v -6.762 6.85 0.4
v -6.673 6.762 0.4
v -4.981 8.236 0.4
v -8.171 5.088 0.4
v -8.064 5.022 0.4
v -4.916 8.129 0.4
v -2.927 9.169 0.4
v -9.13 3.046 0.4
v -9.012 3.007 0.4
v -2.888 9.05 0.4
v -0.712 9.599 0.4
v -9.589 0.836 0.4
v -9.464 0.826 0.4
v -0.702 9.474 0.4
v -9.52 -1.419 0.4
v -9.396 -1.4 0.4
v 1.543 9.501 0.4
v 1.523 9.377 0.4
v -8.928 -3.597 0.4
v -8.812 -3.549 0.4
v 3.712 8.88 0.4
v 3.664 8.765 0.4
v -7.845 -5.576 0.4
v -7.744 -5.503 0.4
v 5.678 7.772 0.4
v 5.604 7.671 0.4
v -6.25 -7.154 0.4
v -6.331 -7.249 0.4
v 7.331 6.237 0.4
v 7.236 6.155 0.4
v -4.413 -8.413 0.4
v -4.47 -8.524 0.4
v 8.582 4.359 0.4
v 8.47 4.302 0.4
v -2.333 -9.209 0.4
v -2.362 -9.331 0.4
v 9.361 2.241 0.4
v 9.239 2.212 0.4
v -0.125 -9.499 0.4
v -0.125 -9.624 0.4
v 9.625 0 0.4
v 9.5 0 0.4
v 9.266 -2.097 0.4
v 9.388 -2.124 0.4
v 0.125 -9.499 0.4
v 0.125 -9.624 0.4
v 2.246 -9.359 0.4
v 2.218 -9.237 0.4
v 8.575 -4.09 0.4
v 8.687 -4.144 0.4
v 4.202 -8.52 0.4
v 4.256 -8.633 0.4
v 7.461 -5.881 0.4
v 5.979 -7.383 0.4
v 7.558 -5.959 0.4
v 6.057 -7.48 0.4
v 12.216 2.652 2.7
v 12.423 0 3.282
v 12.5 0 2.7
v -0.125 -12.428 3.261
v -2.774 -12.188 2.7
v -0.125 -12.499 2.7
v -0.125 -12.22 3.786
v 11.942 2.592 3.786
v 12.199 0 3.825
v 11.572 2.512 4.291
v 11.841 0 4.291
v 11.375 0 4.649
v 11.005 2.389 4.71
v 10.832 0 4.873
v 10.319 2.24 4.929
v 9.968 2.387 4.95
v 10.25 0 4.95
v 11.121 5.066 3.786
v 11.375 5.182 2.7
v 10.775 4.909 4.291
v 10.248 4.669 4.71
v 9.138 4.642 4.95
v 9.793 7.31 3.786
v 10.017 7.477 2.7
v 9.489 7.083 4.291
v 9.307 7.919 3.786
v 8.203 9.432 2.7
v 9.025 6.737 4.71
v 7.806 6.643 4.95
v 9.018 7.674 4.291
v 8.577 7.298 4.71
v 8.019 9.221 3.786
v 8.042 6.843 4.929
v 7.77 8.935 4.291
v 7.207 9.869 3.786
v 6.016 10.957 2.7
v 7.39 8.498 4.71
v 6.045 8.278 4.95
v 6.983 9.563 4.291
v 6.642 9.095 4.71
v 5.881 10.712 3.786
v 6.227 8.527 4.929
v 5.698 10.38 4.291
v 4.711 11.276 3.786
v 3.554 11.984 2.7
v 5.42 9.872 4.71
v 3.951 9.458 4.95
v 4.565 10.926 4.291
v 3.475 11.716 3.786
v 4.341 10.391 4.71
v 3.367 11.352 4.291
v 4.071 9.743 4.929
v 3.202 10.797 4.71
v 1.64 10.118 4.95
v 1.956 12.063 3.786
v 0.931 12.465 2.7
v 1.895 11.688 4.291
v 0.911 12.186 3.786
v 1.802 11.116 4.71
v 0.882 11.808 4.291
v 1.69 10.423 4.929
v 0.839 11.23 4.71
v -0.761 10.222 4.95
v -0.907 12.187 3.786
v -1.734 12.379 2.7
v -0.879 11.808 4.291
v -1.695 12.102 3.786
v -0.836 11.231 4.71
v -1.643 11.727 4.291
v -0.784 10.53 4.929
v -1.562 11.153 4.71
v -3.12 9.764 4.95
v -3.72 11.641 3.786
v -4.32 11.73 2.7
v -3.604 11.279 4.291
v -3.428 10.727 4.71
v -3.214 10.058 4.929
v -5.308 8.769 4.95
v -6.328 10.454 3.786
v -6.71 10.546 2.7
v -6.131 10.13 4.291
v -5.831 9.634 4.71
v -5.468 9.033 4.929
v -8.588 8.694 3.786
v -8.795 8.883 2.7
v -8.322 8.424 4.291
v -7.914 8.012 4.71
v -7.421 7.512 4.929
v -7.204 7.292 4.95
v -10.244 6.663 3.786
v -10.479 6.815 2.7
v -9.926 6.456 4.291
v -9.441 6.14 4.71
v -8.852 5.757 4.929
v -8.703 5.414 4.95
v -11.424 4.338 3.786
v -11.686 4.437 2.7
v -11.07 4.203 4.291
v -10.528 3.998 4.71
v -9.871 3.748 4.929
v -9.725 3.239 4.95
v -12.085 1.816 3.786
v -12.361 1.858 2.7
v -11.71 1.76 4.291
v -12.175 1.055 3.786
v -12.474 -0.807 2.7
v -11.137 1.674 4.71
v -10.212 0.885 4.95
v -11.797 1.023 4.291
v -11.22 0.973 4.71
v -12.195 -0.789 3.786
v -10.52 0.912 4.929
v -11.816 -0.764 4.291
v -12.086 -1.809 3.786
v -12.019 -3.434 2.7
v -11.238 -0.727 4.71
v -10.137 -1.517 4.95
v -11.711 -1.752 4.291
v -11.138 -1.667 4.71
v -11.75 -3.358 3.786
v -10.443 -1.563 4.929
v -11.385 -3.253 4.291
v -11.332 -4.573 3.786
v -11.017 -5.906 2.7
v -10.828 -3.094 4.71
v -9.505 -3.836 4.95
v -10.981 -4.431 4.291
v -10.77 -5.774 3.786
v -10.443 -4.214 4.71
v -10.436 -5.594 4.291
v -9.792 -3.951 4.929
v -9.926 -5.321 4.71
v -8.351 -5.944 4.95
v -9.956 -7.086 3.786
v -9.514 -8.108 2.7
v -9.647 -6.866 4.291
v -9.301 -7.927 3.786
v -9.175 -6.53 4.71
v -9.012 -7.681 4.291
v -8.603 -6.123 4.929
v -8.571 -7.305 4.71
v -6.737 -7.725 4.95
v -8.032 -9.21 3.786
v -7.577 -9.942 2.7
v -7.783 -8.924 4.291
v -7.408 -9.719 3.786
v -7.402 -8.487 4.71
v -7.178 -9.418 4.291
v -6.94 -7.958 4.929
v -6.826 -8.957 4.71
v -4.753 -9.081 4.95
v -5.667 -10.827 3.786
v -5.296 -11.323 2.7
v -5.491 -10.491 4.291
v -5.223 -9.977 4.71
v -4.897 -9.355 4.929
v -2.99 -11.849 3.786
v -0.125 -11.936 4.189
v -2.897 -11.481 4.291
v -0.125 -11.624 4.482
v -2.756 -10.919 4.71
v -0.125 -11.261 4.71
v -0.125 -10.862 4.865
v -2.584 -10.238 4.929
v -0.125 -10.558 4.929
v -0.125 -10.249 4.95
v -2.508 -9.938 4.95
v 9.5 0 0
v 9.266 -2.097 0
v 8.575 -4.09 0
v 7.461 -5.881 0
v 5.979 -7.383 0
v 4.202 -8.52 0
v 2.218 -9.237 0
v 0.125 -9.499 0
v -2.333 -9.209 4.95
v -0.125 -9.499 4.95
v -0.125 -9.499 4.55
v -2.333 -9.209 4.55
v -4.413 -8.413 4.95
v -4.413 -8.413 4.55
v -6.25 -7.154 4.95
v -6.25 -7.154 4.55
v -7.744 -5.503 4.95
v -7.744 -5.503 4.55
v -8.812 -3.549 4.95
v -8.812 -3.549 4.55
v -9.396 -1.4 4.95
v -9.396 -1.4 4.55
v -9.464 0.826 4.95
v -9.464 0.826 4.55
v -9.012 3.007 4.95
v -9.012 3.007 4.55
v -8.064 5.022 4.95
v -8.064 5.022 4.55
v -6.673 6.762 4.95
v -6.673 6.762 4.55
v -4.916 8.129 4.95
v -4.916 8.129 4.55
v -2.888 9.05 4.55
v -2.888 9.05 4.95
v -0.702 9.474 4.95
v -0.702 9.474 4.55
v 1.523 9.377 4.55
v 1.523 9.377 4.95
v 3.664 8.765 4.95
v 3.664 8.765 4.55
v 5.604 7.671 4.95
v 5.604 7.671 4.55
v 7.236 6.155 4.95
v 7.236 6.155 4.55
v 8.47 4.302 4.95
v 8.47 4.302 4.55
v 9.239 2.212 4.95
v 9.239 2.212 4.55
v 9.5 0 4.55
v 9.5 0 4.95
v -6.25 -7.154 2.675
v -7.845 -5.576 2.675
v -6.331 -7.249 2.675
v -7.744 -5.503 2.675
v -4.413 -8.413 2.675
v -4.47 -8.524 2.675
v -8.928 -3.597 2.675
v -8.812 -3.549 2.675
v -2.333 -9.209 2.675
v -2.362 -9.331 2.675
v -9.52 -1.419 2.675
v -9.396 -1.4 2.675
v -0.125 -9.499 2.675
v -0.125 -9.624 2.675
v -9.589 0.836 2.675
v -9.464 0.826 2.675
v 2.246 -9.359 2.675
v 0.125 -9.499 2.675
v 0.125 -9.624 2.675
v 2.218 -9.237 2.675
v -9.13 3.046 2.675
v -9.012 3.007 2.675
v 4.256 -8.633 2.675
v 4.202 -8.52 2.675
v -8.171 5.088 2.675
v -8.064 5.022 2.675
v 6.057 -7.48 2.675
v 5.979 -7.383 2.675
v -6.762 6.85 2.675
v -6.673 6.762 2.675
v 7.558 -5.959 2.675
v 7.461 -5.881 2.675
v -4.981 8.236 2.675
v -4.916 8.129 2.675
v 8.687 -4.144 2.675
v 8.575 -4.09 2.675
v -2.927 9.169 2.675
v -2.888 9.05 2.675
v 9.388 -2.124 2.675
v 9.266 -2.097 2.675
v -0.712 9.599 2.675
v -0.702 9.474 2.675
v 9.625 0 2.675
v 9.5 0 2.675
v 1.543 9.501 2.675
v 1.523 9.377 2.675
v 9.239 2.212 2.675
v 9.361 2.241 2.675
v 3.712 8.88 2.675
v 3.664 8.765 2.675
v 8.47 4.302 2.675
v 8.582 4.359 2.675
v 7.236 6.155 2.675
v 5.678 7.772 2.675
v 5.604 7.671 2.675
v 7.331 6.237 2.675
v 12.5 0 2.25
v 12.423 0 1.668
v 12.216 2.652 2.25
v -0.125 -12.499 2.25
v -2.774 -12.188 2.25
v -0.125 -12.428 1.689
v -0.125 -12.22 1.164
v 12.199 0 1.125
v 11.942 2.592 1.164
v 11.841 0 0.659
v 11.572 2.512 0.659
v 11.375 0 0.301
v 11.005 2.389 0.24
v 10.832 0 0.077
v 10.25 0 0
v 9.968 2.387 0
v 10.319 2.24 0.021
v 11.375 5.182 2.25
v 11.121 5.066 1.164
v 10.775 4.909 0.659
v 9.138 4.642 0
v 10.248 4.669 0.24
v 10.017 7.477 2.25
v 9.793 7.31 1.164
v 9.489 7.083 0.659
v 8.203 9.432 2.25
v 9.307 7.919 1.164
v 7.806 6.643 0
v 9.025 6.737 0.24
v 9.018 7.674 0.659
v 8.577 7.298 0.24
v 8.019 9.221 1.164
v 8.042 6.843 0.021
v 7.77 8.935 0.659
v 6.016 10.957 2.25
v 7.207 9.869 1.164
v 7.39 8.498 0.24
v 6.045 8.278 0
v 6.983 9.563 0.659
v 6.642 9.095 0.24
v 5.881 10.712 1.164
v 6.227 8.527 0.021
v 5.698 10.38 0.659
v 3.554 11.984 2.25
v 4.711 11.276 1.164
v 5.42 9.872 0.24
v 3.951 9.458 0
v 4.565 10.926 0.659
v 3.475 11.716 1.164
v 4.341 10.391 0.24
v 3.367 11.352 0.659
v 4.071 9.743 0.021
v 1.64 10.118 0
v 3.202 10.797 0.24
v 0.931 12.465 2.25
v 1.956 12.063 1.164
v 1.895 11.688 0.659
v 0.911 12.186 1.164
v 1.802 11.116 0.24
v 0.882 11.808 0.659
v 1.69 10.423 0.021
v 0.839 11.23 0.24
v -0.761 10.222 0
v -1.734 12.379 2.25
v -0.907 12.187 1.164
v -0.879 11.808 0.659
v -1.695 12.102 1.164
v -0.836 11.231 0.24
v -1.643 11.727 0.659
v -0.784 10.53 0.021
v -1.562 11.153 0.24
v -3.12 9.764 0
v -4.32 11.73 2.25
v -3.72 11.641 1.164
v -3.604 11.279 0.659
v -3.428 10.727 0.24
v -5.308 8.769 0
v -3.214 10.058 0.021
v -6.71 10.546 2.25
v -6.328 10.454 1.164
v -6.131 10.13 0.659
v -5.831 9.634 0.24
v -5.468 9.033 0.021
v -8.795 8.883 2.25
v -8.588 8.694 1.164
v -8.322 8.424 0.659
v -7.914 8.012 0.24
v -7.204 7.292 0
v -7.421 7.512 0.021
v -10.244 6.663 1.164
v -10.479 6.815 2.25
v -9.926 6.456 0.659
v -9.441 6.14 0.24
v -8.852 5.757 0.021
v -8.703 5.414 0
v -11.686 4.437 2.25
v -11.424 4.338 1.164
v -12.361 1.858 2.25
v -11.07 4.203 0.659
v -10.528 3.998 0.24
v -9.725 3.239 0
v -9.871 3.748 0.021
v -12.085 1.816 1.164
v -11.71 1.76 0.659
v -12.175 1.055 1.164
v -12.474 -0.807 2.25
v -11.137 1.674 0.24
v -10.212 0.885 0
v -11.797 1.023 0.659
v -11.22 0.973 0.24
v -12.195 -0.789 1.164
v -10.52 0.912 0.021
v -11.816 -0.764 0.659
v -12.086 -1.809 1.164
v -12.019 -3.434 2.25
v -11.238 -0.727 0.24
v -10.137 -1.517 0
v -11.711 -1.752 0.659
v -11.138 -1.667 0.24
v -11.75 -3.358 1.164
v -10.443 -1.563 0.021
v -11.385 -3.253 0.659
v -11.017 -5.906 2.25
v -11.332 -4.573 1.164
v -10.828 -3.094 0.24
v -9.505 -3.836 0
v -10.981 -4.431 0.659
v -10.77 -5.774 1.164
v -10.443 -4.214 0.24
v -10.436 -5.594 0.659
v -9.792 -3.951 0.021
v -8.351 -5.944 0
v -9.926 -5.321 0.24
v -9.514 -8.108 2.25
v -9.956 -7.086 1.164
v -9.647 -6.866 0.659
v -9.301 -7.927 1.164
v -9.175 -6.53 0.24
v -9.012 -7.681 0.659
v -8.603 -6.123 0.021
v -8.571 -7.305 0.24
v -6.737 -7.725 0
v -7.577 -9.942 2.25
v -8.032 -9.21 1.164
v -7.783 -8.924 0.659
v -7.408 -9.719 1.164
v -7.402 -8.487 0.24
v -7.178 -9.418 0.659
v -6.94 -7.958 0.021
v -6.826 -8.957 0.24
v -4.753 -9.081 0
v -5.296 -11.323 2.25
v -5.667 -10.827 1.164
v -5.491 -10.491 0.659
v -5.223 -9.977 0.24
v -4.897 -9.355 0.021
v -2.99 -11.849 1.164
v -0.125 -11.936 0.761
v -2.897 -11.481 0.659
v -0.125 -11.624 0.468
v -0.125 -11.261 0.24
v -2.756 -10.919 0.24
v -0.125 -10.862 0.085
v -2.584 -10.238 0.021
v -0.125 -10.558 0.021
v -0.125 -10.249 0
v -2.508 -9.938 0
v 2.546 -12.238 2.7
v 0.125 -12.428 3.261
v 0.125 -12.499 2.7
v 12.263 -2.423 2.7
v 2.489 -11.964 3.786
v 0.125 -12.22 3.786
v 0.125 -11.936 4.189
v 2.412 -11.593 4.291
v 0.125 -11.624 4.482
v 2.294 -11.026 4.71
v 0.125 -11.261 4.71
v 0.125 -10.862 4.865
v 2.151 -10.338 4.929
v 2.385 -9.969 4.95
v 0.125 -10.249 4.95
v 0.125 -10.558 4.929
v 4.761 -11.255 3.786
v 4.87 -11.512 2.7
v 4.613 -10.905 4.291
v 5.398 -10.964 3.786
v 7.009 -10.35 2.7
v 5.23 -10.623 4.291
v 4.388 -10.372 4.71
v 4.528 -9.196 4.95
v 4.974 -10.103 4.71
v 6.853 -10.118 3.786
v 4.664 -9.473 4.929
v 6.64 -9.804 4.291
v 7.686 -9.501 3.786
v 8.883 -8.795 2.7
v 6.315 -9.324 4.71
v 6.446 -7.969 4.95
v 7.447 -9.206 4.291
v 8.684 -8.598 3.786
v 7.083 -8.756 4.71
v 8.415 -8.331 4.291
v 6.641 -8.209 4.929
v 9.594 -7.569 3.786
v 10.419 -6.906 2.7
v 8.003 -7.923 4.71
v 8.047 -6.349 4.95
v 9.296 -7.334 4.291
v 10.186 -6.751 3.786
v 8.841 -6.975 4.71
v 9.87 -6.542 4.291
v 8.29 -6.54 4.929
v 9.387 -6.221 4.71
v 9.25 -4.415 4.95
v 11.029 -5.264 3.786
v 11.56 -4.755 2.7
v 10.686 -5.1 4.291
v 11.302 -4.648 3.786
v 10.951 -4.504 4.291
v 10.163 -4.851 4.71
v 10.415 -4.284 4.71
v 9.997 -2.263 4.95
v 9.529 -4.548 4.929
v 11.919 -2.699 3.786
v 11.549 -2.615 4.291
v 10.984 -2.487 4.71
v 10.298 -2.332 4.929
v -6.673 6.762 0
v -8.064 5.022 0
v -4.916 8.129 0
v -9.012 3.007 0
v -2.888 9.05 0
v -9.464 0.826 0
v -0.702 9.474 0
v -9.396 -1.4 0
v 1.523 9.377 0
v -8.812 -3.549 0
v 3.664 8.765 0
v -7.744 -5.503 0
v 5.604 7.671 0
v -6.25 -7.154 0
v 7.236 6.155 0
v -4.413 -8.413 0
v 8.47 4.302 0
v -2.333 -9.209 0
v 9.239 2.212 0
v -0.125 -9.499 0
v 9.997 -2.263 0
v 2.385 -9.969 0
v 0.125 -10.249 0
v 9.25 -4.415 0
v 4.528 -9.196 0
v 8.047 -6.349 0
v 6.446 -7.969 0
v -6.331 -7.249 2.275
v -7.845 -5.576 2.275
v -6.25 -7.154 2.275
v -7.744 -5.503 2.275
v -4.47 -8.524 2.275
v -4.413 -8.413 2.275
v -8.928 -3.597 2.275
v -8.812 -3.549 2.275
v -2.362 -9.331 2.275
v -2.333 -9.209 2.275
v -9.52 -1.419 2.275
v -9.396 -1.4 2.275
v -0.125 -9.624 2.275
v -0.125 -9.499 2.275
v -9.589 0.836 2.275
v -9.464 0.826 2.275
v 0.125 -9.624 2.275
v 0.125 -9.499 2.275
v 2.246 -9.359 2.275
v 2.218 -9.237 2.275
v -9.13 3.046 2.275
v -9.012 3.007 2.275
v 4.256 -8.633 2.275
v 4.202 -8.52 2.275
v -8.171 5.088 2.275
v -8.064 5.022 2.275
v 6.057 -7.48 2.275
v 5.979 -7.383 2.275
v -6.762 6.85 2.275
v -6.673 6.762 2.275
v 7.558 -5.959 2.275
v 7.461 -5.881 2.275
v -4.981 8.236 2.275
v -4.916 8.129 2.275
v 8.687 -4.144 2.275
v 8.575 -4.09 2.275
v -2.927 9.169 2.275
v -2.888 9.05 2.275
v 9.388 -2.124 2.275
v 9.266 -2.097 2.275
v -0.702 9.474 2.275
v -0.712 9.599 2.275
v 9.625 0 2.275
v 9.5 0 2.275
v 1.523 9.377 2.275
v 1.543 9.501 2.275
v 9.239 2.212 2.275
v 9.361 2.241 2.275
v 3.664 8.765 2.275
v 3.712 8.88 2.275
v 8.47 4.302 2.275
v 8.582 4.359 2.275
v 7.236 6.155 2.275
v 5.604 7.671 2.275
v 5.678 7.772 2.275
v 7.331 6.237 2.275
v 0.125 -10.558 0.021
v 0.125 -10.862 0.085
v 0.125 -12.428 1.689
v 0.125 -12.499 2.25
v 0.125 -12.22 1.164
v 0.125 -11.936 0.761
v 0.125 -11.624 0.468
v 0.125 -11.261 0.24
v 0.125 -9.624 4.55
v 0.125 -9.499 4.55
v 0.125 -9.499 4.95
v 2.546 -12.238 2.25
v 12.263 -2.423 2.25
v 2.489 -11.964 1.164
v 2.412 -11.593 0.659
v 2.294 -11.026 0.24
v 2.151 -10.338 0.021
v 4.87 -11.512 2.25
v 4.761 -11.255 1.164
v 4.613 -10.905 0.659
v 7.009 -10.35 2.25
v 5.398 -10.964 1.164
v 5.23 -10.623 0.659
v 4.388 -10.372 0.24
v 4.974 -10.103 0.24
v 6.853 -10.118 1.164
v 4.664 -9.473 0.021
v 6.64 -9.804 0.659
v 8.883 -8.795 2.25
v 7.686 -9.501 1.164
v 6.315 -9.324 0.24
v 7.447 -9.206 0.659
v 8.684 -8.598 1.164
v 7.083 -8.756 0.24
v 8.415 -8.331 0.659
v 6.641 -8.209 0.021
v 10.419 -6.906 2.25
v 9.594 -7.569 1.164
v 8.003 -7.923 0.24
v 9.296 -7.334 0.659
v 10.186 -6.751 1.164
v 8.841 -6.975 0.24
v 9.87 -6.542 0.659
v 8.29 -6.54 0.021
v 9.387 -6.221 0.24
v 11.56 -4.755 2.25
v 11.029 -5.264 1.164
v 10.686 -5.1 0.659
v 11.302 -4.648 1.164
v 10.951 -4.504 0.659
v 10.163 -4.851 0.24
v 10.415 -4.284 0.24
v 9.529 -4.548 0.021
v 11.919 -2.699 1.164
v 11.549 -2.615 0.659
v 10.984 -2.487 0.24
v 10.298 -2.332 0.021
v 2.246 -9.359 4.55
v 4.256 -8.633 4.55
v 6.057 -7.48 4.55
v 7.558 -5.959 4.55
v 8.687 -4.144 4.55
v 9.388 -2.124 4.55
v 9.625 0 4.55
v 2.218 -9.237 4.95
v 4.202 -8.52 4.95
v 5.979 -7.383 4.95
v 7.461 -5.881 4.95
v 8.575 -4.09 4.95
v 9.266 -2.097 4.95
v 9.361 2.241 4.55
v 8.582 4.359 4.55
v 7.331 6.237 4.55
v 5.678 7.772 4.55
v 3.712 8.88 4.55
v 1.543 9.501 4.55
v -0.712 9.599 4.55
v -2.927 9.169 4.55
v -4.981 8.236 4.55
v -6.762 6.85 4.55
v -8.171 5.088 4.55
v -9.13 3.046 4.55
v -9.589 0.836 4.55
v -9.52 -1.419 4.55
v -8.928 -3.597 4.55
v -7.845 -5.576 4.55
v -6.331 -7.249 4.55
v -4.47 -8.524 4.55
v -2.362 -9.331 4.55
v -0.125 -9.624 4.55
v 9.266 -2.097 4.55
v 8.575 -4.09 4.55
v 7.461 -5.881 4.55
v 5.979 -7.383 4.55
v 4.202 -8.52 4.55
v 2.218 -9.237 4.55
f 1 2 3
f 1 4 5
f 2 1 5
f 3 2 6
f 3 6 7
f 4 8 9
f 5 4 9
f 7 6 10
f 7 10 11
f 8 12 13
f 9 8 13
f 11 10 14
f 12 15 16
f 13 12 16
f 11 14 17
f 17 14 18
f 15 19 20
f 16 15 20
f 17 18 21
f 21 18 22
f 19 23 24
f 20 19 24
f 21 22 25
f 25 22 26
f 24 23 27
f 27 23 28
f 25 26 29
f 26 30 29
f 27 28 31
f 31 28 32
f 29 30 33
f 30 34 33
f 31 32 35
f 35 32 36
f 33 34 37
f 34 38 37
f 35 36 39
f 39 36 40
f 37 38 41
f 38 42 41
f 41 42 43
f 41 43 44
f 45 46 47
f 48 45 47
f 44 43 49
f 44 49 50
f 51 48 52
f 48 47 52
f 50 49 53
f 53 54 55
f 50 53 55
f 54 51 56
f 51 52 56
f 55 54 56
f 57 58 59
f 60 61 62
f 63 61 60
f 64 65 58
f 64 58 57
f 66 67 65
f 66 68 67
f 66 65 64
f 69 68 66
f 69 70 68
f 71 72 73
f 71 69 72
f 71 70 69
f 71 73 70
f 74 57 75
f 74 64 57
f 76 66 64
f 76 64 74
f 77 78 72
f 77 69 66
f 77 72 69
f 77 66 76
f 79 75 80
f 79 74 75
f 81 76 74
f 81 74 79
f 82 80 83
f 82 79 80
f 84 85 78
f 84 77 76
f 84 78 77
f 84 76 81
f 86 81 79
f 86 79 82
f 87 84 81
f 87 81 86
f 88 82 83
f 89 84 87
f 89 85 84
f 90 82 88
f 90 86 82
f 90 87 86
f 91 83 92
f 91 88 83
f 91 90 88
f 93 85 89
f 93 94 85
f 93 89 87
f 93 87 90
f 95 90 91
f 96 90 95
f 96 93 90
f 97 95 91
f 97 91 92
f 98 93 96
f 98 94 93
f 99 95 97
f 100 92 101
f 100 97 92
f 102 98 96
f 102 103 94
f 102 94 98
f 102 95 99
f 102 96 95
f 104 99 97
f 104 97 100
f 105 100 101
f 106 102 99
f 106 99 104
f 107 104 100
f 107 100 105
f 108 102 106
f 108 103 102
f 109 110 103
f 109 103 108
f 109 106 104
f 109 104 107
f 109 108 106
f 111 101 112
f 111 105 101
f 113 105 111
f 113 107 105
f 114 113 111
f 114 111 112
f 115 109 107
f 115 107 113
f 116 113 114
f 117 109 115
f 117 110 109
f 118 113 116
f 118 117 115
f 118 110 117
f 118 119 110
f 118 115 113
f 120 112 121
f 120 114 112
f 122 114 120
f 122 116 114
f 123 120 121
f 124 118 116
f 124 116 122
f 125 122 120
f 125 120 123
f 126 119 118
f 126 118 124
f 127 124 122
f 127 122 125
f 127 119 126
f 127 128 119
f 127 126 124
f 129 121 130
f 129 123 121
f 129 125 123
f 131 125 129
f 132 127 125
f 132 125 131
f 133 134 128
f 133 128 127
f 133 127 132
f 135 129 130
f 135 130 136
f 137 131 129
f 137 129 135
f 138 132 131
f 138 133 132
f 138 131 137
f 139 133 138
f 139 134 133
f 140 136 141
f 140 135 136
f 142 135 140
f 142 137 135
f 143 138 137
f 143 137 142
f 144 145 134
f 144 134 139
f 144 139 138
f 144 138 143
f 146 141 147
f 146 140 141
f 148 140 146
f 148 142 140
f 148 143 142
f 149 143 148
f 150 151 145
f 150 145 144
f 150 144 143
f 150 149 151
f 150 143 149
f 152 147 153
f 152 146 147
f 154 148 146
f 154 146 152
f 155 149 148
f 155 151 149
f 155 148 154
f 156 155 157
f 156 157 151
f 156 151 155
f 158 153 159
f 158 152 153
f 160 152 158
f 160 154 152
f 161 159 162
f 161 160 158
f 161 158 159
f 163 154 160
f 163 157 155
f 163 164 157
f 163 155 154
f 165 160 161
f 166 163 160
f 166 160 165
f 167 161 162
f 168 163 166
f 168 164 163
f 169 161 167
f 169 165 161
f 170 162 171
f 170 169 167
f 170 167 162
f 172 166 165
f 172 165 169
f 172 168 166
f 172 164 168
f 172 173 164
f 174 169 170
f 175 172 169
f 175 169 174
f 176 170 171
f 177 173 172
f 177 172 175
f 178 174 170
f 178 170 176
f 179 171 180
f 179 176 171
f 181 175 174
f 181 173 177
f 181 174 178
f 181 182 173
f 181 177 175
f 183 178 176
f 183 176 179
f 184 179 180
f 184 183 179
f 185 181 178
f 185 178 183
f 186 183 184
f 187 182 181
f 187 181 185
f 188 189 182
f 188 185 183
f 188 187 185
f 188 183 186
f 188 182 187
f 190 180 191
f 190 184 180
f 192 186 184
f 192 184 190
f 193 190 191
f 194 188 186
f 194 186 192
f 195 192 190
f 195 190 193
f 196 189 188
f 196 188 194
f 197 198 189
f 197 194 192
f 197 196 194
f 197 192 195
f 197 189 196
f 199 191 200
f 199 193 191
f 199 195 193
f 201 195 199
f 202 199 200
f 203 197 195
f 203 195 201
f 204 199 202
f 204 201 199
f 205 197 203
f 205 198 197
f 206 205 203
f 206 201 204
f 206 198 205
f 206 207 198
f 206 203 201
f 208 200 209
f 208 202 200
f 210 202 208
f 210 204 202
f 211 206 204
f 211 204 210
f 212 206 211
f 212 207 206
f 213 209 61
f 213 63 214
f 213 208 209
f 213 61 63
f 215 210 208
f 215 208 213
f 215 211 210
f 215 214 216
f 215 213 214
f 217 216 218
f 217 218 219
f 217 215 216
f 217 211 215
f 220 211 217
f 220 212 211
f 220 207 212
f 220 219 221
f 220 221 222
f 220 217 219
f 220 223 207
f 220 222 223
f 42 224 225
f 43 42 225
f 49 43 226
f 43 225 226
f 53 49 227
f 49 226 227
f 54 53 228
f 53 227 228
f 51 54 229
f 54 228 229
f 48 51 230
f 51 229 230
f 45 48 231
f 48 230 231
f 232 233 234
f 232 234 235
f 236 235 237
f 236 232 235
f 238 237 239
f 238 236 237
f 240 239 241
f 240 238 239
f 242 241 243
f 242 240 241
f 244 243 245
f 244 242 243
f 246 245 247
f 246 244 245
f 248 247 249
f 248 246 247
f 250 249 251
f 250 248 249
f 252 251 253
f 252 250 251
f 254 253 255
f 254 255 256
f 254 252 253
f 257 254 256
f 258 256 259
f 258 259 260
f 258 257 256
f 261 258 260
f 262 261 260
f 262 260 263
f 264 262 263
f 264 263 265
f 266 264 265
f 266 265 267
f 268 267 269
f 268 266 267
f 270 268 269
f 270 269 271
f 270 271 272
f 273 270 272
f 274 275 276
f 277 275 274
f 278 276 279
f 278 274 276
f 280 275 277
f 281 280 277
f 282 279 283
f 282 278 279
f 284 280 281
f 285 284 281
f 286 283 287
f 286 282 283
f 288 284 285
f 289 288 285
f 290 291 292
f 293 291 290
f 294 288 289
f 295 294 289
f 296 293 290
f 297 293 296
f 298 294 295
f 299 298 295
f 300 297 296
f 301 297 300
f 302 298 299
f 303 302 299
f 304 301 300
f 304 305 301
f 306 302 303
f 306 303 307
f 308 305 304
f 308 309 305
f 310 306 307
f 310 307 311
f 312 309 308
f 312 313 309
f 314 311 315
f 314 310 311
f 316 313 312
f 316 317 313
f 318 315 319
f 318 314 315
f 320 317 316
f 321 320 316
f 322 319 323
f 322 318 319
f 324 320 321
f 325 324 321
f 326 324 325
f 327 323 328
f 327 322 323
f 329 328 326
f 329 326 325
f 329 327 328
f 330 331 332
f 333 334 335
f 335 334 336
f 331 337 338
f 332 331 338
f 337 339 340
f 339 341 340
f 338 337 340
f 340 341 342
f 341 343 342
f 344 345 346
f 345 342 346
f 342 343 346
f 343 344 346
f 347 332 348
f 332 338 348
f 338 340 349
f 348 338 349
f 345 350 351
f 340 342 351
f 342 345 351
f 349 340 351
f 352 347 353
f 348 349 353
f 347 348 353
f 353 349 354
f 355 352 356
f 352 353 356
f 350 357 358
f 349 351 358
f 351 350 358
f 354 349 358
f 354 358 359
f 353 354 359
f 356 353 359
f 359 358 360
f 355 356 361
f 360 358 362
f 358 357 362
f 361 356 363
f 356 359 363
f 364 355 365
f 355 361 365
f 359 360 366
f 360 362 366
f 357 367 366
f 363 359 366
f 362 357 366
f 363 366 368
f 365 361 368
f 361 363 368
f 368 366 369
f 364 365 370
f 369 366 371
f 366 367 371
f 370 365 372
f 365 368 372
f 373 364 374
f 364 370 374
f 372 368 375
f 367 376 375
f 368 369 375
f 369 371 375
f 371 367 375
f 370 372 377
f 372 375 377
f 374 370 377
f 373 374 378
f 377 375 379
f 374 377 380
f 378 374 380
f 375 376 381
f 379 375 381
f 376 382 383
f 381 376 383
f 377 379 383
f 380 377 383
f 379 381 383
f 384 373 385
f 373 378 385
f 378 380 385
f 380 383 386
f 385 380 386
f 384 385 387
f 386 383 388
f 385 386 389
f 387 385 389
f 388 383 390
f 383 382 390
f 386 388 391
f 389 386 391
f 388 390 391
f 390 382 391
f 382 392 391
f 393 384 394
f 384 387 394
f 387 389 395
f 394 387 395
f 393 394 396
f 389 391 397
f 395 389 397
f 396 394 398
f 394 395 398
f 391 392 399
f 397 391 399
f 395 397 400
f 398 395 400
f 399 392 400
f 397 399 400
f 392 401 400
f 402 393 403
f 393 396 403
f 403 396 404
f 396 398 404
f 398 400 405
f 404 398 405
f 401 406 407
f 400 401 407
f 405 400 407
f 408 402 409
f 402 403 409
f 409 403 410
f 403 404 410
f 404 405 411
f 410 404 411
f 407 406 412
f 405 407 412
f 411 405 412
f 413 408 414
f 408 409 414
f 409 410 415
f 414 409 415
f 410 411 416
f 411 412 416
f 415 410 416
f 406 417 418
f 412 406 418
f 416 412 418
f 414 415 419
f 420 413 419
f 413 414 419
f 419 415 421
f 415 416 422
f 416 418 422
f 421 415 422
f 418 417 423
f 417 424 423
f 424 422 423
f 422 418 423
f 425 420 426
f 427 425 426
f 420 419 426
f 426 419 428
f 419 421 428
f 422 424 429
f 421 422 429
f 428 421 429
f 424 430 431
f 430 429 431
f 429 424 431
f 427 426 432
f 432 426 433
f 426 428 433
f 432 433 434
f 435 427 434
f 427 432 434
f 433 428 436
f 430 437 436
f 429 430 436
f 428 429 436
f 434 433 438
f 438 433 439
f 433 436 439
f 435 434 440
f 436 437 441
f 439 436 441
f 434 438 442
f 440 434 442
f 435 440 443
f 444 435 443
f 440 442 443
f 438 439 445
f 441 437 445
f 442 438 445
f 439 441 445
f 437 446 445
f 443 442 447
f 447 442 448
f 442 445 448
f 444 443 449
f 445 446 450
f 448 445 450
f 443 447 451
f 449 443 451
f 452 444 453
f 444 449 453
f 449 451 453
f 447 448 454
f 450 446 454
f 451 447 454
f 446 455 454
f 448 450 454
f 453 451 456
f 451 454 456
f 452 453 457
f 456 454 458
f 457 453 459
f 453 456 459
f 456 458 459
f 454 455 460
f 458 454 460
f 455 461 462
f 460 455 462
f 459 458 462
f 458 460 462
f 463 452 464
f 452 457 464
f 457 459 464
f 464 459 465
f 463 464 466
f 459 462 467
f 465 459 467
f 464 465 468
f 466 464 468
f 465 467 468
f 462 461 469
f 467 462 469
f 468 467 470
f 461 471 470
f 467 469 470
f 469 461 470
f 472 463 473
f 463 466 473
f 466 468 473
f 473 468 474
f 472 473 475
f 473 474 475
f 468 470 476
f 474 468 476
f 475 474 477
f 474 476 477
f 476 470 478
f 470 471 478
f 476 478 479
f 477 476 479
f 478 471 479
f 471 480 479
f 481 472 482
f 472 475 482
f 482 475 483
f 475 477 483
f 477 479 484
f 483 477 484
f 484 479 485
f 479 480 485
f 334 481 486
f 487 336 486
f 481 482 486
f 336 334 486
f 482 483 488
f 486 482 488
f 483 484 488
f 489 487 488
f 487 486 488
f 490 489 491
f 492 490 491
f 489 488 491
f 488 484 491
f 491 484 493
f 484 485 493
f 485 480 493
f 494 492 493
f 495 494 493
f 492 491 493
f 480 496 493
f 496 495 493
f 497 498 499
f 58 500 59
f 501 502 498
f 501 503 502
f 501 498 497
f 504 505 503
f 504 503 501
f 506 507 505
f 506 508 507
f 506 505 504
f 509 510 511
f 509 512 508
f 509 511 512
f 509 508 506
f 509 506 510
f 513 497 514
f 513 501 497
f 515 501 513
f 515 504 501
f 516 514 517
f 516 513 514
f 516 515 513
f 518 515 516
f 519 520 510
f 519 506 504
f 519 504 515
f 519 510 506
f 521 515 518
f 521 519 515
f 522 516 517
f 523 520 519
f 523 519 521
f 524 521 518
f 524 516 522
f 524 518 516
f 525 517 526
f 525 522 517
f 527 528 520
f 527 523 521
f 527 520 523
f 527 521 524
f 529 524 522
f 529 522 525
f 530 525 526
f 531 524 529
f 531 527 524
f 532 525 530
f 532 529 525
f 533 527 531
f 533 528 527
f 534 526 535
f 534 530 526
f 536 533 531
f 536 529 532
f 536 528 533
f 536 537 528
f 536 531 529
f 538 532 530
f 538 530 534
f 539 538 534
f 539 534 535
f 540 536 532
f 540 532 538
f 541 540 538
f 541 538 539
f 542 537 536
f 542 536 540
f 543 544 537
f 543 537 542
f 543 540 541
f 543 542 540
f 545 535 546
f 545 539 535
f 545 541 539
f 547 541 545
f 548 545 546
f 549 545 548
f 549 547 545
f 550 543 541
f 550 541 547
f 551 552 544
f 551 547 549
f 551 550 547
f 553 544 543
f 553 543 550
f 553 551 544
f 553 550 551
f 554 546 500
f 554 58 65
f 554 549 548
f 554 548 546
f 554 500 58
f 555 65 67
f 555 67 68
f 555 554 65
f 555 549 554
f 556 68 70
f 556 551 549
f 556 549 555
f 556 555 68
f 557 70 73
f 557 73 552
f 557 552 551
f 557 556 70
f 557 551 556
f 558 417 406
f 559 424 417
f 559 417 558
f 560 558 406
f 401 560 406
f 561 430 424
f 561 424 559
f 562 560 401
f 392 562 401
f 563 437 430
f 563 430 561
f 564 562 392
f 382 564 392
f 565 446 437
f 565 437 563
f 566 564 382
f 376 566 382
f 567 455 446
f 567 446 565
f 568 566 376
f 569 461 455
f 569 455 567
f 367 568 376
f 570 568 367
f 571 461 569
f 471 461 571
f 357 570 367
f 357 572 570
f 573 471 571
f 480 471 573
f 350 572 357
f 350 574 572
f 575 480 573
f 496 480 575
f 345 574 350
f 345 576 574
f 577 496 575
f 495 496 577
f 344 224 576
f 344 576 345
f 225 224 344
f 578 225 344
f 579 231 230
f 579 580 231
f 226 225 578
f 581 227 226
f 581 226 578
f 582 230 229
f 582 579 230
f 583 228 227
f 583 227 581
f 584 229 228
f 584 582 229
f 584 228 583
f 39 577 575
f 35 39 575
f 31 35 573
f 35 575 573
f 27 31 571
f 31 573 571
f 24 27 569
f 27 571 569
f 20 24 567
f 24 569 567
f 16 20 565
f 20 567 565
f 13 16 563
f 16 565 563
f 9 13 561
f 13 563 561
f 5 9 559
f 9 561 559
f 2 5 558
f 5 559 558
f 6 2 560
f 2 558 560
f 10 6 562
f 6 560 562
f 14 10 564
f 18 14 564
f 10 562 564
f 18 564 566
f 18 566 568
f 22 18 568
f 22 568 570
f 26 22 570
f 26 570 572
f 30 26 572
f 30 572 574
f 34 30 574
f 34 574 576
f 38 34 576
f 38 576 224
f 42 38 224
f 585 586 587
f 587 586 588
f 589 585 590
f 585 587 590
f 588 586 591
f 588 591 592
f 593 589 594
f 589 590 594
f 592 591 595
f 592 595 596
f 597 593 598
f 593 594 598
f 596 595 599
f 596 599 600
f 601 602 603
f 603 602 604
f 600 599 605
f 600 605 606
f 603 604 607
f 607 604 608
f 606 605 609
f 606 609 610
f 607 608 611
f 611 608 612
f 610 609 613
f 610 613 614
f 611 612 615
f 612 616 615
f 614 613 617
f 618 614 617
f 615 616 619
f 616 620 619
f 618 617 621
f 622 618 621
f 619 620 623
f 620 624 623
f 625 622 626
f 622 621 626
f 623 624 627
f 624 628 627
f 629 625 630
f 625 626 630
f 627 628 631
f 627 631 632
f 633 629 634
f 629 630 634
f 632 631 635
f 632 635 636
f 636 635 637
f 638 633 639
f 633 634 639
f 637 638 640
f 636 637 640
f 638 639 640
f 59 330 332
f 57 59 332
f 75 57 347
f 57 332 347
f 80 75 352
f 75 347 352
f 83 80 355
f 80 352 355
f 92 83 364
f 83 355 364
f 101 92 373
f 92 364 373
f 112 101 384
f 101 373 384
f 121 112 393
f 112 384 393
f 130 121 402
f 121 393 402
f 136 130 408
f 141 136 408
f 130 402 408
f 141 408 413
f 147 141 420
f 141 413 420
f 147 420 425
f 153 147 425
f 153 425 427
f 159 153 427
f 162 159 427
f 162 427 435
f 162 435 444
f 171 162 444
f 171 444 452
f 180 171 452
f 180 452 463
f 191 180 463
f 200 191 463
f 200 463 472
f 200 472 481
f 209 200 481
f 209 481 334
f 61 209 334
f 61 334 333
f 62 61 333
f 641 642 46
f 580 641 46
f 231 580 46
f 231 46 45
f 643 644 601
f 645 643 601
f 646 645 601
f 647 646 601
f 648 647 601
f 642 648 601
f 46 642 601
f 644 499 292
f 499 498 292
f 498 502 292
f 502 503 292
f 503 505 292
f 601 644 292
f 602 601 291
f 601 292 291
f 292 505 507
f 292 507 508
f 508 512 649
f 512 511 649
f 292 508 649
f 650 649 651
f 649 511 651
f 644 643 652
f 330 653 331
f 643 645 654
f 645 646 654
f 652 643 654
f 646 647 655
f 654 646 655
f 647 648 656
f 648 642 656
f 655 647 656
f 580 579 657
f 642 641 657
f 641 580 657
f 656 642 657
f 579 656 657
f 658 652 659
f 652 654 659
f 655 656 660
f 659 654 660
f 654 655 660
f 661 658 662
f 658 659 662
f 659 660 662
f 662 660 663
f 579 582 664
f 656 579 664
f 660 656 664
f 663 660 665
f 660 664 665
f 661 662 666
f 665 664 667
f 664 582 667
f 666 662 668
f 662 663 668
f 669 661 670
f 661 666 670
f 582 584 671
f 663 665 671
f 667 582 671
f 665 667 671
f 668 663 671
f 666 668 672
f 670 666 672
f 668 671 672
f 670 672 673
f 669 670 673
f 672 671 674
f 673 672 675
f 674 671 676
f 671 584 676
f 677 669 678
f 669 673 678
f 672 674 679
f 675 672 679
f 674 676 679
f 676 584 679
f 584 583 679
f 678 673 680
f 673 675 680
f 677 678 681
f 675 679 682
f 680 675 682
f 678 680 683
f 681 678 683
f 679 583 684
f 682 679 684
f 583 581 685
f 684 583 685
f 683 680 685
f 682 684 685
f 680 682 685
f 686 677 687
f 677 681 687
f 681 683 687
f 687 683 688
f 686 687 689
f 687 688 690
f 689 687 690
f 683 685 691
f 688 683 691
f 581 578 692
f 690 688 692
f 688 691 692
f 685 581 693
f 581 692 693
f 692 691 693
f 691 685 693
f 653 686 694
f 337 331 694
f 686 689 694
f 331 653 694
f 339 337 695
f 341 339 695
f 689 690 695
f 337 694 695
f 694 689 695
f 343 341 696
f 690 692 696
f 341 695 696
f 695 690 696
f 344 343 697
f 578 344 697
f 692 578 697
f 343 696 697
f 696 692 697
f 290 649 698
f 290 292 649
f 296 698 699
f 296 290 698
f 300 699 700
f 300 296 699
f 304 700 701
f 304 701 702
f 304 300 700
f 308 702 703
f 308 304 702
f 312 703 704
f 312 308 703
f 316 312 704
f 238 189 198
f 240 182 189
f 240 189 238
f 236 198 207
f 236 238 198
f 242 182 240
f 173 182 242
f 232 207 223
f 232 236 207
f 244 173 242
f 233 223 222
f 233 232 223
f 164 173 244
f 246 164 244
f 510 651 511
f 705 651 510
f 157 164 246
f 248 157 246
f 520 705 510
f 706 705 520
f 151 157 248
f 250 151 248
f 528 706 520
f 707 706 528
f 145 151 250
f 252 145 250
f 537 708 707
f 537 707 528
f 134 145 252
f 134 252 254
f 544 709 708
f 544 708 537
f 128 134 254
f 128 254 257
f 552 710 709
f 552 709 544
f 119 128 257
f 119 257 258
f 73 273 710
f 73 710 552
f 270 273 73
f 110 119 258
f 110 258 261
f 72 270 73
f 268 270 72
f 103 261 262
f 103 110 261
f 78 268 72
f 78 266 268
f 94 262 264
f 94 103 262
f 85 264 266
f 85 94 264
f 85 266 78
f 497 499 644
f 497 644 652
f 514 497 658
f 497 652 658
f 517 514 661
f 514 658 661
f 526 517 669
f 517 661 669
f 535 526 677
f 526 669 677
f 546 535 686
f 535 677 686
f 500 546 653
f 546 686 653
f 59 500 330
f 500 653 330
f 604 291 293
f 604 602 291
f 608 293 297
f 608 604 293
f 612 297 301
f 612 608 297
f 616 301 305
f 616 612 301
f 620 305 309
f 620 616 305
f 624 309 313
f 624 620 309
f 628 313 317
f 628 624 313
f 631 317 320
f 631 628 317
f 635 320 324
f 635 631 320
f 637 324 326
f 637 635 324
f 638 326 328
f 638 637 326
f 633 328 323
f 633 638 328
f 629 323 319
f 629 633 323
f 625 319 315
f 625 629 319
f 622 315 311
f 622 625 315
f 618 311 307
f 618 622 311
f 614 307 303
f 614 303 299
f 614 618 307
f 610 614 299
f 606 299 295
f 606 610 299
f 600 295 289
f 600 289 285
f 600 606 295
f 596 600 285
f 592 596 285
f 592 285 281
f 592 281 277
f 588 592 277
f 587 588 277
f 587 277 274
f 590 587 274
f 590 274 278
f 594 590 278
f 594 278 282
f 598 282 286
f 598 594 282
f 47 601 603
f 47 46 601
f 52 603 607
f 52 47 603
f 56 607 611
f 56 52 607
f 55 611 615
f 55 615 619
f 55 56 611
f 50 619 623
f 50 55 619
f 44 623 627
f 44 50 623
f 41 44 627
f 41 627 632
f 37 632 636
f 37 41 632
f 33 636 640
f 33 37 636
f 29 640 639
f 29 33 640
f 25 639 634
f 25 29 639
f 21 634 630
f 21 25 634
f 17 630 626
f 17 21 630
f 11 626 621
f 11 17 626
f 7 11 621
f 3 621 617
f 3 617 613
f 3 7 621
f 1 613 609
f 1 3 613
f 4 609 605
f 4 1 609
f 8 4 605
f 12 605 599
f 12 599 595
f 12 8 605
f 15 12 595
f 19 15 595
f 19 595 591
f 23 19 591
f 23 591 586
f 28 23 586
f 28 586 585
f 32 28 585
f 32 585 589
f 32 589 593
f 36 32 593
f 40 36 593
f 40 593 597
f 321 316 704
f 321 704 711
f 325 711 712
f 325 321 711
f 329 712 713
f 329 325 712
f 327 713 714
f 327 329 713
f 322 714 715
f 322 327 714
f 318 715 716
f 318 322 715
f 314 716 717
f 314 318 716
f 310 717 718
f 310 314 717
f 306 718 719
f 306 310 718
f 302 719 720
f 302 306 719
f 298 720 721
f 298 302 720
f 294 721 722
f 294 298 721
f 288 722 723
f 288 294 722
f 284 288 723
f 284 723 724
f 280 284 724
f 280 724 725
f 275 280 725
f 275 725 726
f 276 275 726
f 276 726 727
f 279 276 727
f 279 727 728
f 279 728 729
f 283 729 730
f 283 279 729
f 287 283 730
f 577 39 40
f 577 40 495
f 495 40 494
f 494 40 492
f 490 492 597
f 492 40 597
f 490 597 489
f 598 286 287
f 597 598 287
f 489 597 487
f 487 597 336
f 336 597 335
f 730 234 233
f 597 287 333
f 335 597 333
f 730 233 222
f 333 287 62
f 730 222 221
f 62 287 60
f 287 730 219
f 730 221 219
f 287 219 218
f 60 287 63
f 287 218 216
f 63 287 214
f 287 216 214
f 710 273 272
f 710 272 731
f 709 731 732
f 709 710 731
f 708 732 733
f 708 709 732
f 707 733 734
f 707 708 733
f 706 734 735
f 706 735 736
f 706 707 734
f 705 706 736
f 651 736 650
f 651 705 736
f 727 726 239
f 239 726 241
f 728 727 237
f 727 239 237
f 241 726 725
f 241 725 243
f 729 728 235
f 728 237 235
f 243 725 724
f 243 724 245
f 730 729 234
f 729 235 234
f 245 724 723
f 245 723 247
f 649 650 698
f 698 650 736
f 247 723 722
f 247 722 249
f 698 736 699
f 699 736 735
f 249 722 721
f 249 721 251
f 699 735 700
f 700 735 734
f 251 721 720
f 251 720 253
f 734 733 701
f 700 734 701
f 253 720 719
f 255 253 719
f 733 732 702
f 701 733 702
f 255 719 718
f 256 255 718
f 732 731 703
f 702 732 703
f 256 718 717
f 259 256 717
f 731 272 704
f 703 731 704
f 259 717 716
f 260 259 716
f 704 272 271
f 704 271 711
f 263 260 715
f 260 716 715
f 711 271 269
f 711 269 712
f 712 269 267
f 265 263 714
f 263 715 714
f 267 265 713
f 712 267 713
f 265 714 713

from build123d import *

# Parameters (mm, degrees)
F0_R      = 12.5
F0_R_2    = 9.625
F1_DEPTH  = 4.95
F2_R      = 2.25
F4_R      = 9.625
F4_R_2    = 9.5
F5_DEPTH  = 0.2
F7_R      = 9.625
F7_R_2    = 9.5
F8_DEPTH  = 0.4
F11_DEPTH = 0.4
F12_DEPTH = 25


with BuildPart() as f1:
    # F0 (on Top) → F1 (new body)
    with BuildSketch(Plane.XY):
        Circle(F0_R)
        Circle(F0_R_2, mode=Mode.SUBTRACT)
    extrude(amount=F1_DEPTH)

    # F2
    f2_edges = [f1.edges().sort_by_distance(p)[0] for p in [
        (-12.5, 0, 4.95),
        (-12.5, 0, 0),
    ]]
    fillet(f2_edges, radius=F2_R)

    # F4 (on offset) → F5 (join, symmetric)
    with BuildSketch(Plane.XY.offset(2.475)):
        Circle(F4_R)
        Circle(F4_R_2, mode=Mode.SUBTRACT)
    extrude(amount=F5_DEPTH, both=True)

    # F7 (on offset) → F8 (join)
    with BuildSketch(Plane(origin=(0, 0, 0), x_dir=(1, 0, 0), z_dir=(0, 0, -1))):
        Circle(F7_R)
        Circle(F7_R_2, mode=Mode.SUBTRACT)
    extrude(amount=-F8_DEPTH)

    # F10 (on offset) → F11 (join)
    with BuildSketch(Plane.XY.offset(4.95)):
        with BuildLine():
            ThreePointArc((0.125, -9.499177596), (0, -9.5), (-0.125, -9.499177596))
            Line((-0.125, -9.499177596), (-0.125, -9.6241882775))
            ThreePointArc((-0.125, -9.6241882775), (0, -9.625), (0.125, -9.6241882775))
            Line((0.125, -9.6241882775), (0.125, -9.499177596))
        make_face()
        with BuildLine():
            ThreePointArc((-0.125, -9.499177596), (-6.6731739075, 6.7615641681), (9.5, 0))
            ThreePointArc((9.5, 0), (6.7615641681, -6.6731739075), (0.125, -9.499177596))
            Line((0.125, -9.499177596), (0.125, -9.6241882775))
            ThreePointArc((0.125, -9.6241882775), (6.8499543794, -6.7615641681), (9.625, 0))
            ThreePointArc((9.625, 0), (-6.7615641681, 6.8499543794), (-0.125, -9.6241882775))
            Line((-0.125, -9.6241882775), (-0.125, -9.499177596))
        make_face()
    extrude(amount=-F11_DEPTH)

    # F10 (on offset) → F12 (cut)
    with BuildSketch(Plane.XY.offset(4.95)):
        with BuildLine():
            ThreePointArc((0.125, -9.6241882775), (0, -9.625), (-0.125, -9.6241882775))
            Line((-0.125, -9.6241882775), (-0.125, -12.8121394664))
            Line((-0.125, -12.8121394664), (0.125, -12.8121394664))
            Line((0.125, -12.8121394664), (0.125, -9.6241882775))
        make_face()
        with BuildLine():
            ThreePointArc((0.125, -9.499177596), (0, -9.5), (-0.125, -9.499177596))
            Line((-0.125, -9.499177596), (-0.125, -9.6241882775))
            ThreePointArc((-0.125, -9.6241882775), (0, -9.625), (0.125, -9.6241882775))
            Line((0.125, -9.6241882775), (0.125, -9.499177596))
        make_face()
        with BuildLine():
            Line((-0.125, -8.5825398564), (-0.125, -9.499177596))
            ThreePointArc((-0.125, -9.499177596), (0, -9.5), (0.125, -9.499177596))
            Line((0.125, -9.499177596), (0.125, -8.5825398564))
            Line((0.125, -8.5825398564), (-0.125, -8.5825398564))
        make_face()
    extrude(amount=-F12_DEPTH, mode=Mode.SUBTRACT)


solid = f1.part
